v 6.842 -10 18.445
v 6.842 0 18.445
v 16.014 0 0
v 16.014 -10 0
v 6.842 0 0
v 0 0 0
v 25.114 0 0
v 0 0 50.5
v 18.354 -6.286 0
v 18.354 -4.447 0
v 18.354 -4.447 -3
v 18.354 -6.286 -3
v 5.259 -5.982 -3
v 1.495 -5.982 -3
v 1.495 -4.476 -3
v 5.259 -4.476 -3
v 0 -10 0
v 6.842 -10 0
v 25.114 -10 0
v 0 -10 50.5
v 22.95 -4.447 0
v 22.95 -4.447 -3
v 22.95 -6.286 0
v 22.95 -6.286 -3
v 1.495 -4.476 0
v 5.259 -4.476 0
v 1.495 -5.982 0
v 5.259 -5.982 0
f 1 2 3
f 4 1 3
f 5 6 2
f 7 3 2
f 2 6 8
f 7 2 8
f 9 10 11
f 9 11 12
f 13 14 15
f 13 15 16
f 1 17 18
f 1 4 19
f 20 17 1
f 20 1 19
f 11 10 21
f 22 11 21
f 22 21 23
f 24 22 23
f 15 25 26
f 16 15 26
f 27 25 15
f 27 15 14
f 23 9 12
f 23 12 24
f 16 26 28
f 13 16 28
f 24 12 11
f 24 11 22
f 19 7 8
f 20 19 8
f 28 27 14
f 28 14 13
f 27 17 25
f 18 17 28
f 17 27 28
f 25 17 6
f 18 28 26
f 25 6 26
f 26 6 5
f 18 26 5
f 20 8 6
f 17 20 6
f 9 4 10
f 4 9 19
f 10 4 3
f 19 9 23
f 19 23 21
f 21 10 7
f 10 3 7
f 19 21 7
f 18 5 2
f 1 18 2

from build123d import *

# Parameters (mm, degrees)
F1_DEPTH = 10
F2_W     = 3.763588
F2_H     = 1.505818
F3_DEPTH = 3
F4_W     = 4.596189
F4_H     = 1.838945
F5_DEPTH = 3


with BuildPart() as f1:
    # F0 (on Front) → F1 (new body)
    with BuildSketch(Plane.XZ):
        Polygon((0, 50.5), (0, 0), (6.841576, 0), (6.841576, 18.445263), (16.01394, 0), (25.11394, 0), align=None)
    extrude(amount=F1_DEPTH)

    # F2 (on face) → F3 (join)
    with BuildSketch(Plane(origin=(0, 0, 0), x_dir=(1, 0, 0), z_dir=(0, 0, -1))):
        with Locations((3.376952, 5.229204)):
            Rectangle(F2_W, F2_H)
    extrude(amount=F3_DEPTH)

    # F4 (on face) → F5 (join)
    with BuildSketch(Plane(origin=(0, 0, 0), x_dir=(1, 0, 0), z_dir=(0, 0, -1))):
        with Locations((20.651922, 5.366659)):
            Rectangle(F4_W, F4_H)
    extrude(amount=F5_DEPTH)


solid = f1.part
